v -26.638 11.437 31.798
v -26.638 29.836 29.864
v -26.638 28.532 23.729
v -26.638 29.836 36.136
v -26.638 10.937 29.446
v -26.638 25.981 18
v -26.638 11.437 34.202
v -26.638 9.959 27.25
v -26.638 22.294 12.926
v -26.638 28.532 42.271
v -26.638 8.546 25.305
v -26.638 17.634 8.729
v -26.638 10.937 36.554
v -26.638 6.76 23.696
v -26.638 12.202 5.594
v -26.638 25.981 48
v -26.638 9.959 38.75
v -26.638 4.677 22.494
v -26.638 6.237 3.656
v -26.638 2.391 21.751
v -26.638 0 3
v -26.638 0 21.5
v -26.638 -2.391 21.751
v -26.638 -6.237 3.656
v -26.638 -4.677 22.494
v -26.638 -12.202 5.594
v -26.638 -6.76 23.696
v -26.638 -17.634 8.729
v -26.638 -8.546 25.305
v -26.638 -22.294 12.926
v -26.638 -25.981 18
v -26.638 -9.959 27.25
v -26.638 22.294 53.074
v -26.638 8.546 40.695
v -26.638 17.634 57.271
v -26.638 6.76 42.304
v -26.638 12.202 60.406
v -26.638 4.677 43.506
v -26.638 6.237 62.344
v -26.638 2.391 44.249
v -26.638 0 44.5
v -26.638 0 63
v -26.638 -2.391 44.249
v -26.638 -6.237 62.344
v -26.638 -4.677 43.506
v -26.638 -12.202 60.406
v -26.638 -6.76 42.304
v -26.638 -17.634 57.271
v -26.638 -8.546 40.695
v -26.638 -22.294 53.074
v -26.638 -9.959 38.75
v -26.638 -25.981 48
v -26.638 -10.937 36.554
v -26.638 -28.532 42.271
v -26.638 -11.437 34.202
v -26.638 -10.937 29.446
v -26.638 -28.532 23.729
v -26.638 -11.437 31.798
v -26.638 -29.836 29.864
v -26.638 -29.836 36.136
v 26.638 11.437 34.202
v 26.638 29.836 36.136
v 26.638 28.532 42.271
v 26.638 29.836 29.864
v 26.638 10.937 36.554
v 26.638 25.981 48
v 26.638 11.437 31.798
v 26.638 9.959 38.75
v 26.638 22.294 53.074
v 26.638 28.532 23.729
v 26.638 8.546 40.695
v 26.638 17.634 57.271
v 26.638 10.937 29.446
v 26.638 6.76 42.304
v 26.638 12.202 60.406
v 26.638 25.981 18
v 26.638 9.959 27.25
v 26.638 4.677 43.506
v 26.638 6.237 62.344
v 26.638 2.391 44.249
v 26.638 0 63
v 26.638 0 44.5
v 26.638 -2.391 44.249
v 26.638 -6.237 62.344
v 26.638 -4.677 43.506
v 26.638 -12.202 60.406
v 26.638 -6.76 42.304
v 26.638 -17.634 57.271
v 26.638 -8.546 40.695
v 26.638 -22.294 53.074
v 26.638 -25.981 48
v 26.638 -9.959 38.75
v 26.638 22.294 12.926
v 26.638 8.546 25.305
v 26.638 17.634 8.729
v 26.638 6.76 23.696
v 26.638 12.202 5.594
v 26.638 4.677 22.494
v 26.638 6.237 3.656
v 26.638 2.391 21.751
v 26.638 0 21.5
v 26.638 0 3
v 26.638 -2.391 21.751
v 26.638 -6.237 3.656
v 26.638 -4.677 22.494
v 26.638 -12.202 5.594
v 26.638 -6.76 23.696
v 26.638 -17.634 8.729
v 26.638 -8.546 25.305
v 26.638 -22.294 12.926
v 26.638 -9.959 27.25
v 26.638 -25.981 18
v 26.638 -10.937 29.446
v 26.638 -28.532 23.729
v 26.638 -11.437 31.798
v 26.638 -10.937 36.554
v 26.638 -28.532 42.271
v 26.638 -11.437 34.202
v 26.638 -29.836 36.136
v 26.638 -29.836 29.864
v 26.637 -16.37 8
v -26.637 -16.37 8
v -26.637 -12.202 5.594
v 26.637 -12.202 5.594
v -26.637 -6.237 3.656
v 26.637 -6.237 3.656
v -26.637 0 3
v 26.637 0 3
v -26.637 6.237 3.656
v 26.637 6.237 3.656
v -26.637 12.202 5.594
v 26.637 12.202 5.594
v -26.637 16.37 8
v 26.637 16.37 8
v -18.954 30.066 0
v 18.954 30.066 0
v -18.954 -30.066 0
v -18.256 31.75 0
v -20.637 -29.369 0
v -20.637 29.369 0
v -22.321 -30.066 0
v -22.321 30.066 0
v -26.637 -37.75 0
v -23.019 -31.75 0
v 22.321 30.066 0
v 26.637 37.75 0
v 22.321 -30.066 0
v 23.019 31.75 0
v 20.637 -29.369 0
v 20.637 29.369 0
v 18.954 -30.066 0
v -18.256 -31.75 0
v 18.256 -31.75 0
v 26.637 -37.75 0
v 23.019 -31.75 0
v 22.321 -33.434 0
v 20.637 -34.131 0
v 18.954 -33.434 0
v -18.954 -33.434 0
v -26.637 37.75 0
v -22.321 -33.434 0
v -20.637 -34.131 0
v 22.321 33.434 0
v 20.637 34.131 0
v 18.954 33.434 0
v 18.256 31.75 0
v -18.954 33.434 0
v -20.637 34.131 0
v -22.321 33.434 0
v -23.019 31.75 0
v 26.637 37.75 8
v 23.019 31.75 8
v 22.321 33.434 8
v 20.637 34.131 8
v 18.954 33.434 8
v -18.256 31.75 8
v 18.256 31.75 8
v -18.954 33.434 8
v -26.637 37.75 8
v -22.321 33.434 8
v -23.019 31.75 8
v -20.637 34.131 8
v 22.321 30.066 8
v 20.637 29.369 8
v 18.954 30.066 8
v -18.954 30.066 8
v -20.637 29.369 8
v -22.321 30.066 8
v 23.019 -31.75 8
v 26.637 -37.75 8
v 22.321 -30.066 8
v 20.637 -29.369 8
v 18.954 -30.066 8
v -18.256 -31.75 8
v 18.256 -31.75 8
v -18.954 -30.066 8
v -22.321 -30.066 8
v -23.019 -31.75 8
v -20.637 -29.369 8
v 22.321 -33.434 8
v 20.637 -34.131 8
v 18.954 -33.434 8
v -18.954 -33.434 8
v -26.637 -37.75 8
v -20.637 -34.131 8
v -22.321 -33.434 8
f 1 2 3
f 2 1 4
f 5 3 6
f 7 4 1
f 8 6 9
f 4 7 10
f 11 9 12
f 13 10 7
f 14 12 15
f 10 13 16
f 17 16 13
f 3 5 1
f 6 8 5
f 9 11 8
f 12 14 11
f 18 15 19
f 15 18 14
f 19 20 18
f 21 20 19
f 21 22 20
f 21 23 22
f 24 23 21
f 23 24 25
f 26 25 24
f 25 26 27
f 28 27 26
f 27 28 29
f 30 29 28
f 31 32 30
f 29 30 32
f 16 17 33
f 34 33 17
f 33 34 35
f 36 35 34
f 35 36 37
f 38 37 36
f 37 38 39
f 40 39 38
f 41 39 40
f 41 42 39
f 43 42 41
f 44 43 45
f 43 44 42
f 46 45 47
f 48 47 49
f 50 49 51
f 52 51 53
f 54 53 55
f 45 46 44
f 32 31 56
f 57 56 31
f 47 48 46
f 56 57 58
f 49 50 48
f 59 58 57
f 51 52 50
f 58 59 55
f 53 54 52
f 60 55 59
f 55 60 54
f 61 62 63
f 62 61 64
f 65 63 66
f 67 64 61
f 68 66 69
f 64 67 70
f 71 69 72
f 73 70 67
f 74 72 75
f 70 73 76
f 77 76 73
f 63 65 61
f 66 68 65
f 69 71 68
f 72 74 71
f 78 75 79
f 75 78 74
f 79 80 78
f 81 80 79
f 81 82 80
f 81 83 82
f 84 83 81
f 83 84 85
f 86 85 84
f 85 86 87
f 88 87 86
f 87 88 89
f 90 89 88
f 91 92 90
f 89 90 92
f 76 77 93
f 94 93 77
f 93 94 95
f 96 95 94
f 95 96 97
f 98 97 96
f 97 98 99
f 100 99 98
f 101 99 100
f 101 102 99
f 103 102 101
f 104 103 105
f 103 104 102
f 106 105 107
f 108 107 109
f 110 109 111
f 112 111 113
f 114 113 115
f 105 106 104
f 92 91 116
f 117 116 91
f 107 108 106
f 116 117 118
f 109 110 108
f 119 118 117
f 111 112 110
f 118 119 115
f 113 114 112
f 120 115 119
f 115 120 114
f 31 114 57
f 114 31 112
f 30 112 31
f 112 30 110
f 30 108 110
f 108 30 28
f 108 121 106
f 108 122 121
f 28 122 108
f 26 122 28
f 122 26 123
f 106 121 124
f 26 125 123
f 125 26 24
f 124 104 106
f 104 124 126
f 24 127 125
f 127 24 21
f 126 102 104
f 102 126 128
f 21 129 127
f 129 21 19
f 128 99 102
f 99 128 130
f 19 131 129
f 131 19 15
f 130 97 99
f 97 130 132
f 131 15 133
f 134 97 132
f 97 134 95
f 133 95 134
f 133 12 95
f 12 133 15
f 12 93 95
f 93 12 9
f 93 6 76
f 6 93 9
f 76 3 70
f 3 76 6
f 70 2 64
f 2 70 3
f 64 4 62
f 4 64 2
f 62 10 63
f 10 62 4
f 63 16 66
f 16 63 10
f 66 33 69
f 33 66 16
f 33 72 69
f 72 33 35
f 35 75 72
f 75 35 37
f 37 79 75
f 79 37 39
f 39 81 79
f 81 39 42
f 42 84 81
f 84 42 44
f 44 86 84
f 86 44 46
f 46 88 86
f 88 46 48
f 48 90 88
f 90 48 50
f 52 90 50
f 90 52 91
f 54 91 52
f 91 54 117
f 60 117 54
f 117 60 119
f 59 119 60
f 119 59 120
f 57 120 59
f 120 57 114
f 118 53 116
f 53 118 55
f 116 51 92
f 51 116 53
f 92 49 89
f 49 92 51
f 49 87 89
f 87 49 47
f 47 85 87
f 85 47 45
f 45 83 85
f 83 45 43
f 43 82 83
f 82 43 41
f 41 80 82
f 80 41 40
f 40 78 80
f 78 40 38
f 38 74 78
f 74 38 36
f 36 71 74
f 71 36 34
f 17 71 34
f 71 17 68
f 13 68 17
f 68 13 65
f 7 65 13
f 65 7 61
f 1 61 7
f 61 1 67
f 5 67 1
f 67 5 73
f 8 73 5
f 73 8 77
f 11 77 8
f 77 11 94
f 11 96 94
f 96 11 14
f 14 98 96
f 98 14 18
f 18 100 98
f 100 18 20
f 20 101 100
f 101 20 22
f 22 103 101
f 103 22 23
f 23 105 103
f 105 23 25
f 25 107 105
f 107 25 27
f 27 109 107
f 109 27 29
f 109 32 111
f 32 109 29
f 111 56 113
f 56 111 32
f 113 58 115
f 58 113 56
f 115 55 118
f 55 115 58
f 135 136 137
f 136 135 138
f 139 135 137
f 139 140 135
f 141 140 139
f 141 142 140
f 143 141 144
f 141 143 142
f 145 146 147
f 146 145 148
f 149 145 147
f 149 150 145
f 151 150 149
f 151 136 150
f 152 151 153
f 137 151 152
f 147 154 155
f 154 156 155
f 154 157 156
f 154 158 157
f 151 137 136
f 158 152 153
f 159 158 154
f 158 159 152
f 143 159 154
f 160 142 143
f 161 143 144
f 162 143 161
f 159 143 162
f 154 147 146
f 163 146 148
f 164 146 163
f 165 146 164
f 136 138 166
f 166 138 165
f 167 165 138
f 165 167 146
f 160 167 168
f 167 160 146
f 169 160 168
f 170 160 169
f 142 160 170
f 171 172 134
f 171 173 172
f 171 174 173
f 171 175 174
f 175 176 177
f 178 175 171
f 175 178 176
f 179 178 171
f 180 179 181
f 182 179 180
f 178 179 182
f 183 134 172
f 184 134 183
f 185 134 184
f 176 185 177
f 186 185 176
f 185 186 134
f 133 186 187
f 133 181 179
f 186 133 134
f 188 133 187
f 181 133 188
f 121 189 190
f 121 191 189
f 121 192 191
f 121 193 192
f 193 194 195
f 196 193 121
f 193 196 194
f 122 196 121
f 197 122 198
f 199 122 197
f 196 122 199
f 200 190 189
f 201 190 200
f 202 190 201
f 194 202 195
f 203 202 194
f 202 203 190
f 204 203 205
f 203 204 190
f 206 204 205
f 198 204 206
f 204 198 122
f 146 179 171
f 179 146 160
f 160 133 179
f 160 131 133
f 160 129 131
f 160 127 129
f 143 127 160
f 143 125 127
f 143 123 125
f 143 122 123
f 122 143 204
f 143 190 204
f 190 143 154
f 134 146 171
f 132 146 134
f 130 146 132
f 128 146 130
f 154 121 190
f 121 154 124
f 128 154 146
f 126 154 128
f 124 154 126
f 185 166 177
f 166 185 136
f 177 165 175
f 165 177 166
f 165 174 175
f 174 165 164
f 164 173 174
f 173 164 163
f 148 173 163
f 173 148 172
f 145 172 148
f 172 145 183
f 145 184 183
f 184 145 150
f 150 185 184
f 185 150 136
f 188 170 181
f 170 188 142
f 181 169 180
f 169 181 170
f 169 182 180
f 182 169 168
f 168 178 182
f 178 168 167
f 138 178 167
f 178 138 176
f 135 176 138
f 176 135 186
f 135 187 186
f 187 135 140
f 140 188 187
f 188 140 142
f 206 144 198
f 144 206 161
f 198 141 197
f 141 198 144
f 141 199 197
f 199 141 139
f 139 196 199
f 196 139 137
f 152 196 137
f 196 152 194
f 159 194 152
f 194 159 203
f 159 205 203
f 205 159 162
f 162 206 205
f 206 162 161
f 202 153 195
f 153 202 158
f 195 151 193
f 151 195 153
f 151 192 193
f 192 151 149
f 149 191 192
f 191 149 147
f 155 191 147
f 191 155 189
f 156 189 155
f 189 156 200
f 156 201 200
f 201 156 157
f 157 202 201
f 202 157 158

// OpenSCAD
//inches
truck_base_hole_w_in = 1.625;
truck_base_hole_l_in = 2.5;  //2.125 for new school

truck_base_hole_w = truck_base_hole_w_in * 25.4;
truck_base_hole_l = truck_base_hole_l_in * 25.4;

truck_base_l = truck_base_hole_l + 12;
truck_base_w = truck_base_hole_w + 12;

base_plate_hole_dia = 4.7625;

module base_plate_2d() {
	difference() {
		square([truck_base_w, truck_base_l], center=true);
		translate([-truck_base_hole_w/2, -truck_base_hole_l/2]) circle(base_plate_hole_dia/2);
		translate([truck_base_hole_w/2, -truck_base_hole_l/2]) circle(base_plate_hole_dia/2);
		translate([truck_base_hole_w/2, truck_base_hole_l/2]) circle(base_plate_hole_dia/2);
		translate([-truck_base_hole_w/2, truck_base_hole_l/2]) circle(base_plate_hole_dia/2);
	}
}

housing_id = 23;
housing_od = 60;

module housing_2d() {
	difference() {
		circle(housing_od/2);
		circle(housing_id/2);
	}
}

base_plate_thick = 8;

module base_plate() {
	linear_extrude(height=base_plate_thick) base_plate_2d();
}

housing_w = truck_base_w;
inset = 5;

module housing() {
	rotate([0,90,0])
	translate([-housing_od/2-base_plate_thick+inset,0,-housing_w/2])
	linear_extrude(height=housing_w) {
		housing_2d();
	}
}

housing();
base_plate();
